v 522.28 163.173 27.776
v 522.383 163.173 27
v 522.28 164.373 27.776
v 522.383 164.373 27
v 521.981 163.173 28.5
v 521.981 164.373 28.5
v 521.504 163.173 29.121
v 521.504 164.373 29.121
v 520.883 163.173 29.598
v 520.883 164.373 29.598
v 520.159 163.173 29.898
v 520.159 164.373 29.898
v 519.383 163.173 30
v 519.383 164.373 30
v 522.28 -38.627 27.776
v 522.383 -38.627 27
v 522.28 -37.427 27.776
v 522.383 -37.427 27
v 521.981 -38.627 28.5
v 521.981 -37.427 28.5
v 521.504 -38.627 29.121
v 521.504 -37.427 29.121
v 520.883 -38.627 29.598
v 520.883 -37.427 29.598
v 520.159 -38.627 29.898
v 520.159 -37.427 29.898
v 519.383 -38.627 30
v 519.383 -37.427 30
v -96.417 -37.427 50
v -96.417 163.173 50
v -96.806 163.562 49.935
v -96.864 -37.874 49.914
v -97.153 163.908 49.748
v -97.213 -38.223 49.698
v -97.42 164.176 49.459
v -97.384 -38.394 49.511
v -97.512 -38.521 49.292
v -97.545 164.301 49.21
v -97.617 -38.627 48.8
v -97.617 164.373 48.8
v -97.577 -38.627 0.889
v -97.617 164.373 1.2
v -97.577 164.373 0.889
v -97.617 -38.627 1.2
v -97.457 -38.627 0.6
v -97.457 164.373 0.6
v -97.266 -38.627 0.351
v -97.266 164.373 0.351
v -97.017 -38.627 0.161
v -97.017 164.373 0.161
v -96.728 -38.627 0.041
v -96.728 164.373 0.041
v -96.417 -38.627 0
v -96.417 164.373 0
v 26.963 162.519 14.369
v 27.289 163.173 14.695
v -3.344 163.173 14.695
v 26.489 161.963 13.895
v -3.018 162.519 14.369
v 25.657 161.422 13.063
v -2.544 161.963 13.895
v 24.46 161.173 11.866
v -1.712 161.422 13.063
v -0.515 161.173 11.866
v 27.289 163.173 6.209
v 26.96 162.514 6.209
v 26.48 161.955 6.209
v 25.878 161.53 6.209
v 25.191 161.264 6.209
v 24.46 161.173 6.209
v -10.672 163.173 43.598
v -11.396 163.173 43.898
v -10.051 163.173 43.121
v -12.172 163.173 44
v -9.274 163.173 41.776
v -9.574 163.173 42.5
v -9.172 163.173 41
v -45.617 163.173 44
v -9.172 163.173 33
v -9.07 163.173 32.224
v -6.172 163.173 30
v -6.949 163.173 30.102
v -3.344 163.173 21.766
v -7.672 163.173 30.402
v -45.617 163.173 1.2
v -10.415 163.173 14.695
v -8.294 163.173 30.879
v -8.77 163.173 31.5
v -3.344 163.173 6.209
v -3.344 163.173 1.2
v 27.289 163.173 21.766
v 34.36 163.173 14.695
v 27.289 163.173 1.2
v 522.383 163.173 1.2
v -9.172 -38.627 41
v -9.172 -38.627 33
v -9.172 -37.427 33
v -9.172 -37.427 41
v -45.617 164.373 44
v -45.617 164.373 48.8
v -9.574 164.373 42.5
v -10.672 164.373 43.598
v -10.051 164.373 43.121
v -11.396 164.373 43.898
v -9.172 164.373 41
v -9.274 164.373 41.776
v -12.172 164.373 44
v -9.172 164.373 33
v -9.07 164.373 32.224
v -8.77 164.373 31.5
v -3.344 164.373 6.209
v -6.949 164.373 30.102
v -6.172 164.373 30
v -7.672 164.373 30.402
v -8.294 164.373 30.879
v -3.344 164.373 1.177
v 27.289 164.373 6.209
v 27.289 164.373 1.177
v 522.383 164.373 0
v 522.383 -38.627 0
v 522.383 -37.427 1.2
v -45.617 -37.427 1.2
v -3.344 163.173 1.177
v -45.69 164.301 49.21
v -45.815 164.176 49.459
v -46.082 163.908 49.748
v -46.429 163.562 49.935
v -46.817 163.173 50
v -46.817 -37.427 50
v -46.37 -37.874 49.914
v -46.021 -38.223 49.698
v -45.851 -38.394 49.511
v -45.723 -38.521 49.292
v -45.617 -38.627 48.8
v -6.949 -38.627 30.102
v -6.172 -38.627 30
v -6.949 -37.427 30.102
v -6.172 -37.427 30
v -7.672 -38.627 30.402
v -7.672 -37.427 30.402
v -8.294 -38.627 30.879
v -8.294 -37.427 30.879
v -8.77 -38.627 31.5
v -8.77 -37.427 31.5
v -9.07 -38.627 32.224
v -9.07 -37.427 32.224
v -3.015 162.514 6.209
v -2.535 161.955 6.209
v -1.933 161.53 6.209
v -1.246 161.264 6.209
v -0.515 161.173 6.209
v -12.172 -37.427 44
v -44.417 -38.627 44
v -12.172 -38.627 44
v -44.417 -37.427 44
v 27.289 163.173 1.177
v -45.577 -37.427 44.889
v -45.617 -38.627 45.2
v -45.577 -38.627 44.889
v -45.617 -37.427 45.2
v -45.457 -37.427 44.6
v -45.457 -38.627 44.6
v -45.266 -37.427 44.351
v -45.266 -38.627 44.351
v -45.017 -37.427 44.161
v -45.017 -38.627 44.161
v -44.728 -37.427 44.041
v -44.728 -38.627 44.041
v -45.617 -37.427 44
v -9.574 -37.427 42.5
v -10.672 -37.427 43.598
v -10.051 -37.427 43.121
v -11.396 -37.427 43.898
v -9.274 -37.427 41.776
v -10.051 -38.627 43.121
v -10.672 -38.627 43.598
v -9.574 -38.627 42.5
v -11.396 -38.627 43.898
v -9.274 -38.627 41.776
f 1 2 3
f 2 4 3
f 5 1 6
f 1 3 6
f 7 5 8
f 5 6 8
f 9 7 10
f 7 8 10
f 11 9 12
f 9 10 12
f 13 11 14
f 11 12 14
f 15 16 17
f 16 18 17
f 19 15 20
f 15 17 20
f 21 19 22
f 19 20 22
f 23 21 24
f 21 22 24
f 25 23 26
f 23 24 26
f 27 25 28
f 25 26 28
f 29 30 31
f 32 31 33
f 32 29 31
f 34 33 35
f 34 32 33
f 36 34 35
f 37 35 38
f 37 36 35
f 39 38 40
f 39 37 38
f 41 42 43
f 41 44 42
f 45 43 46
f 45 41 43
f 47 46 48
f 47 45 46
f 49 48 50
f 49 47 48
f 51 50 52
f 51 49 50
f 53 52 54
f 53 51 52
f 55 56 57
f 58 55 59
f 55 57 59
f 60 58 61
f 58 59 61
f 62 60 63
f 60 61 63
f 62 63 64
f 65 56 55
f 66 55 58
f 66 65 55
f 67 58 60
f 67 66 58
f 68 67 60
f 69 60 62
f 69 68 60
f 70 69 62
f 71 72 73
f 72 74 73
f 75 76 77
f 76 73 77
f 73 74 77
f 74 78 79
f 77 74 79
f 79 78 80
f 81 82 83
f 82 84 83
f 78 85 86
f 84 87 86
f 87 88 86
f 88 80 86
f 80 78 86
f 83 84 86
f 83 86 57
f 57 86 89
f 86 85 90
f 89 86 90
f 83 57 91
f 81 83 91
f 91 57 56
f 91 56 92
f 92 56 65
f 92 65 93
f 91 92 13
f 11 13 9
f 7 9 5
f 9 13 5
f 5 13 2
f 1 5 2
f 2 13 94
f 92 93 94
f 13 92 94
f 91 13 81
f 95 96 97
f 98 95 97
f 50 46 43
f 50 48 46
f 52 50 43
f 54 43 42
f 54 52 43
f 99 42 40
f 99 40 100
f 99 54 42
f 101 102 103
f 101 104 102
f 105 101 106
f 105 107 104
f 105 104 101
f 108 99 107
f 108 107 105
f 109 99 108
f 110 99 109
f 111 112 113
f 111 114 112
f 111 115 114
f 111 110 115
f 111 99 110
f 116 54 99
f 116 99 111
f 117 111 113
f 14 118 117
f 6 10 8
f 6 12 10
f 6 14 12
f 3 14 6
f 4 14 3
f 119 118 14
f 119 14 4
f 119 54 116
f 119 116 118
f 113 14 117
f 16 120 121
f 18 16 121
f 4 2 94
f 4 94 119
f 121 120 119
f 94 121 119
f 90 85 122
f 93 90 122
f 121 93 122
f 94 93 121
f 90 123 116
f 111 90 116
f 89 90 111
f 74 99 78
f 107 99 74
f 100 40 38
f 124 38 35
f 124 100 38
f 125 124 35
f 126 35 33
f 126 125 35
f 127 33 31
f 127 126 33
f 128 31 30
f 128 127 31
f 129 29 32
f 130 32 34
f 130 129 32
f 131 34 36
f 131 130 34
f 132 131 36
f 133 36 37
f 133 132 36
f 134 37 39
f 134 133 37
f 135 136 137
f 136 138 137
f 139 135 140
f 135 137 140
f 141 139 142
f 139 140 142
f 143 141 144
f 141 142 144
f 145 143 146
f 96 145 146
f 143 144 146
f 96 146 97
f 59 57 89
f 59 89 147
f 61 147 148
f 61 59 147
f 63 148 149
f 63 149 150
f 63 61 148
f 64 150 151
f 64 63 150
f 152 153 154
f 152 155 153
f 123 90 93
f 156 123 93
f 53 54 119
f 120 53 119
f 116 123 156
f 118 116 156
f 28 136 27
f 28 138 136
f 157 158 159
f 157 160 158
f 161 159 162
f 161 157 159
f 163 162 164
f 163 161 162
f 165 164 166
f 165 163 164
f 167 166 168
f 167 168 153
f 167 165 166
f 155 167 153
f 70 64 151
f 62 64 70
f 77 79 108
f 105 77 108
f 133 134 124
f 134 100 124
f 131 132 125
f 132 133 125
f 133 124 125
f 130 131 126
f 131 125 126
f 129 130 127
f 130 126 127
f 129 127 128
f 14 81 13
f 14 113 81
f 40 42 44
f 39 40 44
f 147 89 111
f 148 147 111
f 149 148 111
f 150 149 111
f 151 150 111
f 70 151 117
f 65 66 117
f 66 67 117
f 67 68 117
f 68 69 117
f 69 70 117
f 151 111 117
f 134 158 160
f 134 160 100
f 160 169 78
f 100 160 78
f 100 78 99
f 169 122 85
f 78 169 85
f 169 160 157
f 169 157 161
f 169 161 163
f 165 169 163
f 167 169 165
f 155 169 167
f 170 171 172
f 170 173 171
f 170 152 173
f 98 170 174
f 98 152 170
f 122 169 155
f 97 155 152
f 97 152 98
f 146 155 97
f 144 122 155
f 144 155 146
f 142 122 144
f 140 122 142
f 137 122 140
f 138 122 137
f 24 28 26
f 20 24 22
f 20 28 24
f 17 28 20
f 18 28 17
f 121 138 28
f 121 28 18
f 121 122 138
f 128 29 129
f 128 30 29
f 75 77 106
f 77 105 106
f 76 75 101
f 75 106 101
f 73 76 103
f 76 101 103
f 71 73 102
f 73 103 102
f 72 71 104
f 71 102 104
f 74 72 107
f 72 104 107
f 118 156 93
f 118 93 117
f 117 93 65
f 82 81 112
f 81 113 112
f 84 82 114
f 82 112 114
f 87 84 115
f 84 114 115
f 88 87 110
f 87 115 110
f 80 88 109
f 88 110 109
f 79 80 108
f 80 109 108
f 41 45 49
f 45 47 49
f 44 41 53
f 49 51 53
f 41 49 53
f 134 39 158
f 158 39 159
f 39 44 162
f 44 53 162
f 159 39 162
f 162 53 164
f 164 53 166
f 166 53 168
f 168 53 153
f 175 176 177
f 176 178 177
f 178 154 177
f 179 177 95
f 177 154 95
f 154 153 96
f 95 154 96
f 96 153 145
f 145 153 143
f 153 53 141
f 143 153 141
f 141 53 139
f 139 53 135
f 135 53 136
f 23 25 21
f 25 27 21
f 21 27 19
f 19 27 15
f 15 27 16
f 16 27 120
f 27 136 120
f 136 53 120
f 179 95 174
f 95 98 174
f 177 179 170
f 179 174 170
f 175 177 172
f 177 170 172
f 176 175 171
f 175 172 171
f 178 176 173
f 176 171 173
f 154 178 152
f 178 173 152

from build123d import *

# Parameters (mm, degrees)
F0_W          = 52
F0_H          = 1.2
F0_H_2        = 200.6
F1_DEPTH      = 50
F0_W_2        = 36.4451892475
F2_DEPTH      = 44
F0_W_3        = 531.5548107525
F3_DEPTH      = 30
F4_DEPTH      = 1.2
F5_R          = 1.2
F6_R          = 3
F7_W          = 30.6323694531
F7_H          = 5.0316524575
F8_DEPTH      = 25
F9_W          = 30.6323694531
F9_H          = 8.4860329516
F10_DEPTH     = 2
F11_T1_DEPTH  = 44.7745050768
F11_T6_DEPTH  = 22.6281685754
F11_T11_DEPTH = 22.6281685754


# Not quite as in the source:
# - a fillet or chamfer that OpenCascade refuses, or shapes differently, is made with other operations: its cross-section is extruded or revolved along the edge and cut away or added


with BuildPart() as f1:
    # F0 (on Top) → F1 (new body)
    with BuildSketch(Plane.XY):
        with Locations((-71.6174369702, 163.7731539965)):
            Rectangle(F0_W, F0_H)
        with Locations((-71.6174369702, 62.8731539965)):
            Rectangle(F0_W, F0_H_2)
        with Locations((-71.6174369702, -38.0268460035)):
            Rectangle(F0_W, F0_H)
    extrude(amount=F1_DEPTH)

    # F0 (on Top) → F2 (join)
    with BuildSketch(Plane.XY):
        with Locations((-27.3948423465, -38.0268460035)):
            Rectangle(F0_W_2, F0_H)
        with Locations((-27.3948423465, 163.7731539965)):
            Rectangle(F0_W_2, F0_H)
    extrude(amount=F2_DEPTH)

    # F0 (on Top) → F3 (join)
    with BuildSketch(Plane.XY):
        with Locations((256.6051576535, 163.7731539965)):
            Rectangle(F0_W_3, F0_H)
        with Locations((256.6051576535, -38.0268460035)):
            Rectangle(F0_W_3, F0_H)
    extrude(amount=F3_DEPTH)

    # F0 (on Top) → F4 (join)
    with BuildSketch(Plane.XY):
        with Locations((256.6051576535, 62.8731539965)):
            Rectangle(F0_W_3, F0_H_2)
        with Locations((-27.3948423465, 62.8731539965)):
            Rectangle(F0_W_2, F0_H_2)
    extrude(amount=F4_DEPTH)

    # F5
    f5_edges = [f1.edges().sort_by_distance(p)[0] for p in [
        (-71.617437, -38.626846, 50),
        (-71.617437, 164.373154, 50),
        (-97.617437, 62.873154, 50),
        (-97.617437, 62.873154, 0),
        (-45.617437, 62.873154, 50),
        (-45.617437, -38.026846, 44),
    ]]
    fillet(f5_edges, radius=F5_R)

    # F6
    f6_edges = [f1.edges().sort_by_distance(p)[0] for p in [
        (-9.172248, -38.026846, 44),
        (522.382563, -38.026846, 30),
        (522.382563, 163.773154, 30),
        (-9.172248, 163.773154, 44),
        (-9.172248, 163.773154, 30),
        (-9.172248, -38.026846, 30),
    ]]
    fillet(f6_edges, radius=F6_R)

    # F7 (on face) → F8 (cut)
    with BuildSketch(Plane.XZ.offset(-163.1731539965)):
        with Locations((11.9725436671, 3.6928627233)):
            Rectangle(F7_W, F7_H)
    extrude(amount=-F8_DEPTH, mode=Mode.SUBTRACT)

    # F9 (on face) → F10 (join)
    with BuildSketch(Plane.XZ.offset(-163.1731539965)):
        with Locations((11.9725436671, 10.4517054278)):
            Rectangle(F9_W, F9_H)
    extrude(amount=F10_DEPTH)

    # F11: fillet of radius 3 on 3 edges, made by hand

    # F11_s2 → F11_t1 (cut)
    with BuildSketch(Plane.YZ.offset(-10.4147088713)):
        with BuildLine():
            ThreePointArc((163.1731539965, 14.6947219037), (161.7236642537, 13.5983455865), (161.1731539965, 11.8662947789))
            Line((161.1731539965, 11.8662947789), (161.1731539965, 14.6947219037))
            Line((161.1731539965, 14.6947219037), (163.1731539965, 14.6947219037))
        make_face()
    extrude(amount=F11_T1_DEPTH, mode=Mode.SUBTRACT)


with BuildPart() as f11_tool4:
    # F11_s5 → F11_t6 (new body)
    with BuildSketch(Plane.XY.offset(-0.8623788598)):
        with BuildLine():
            ThreePointArc((27.2887283936, 163.1731539965), (26.1923520764, 161.7236642537), (24.4603012689, 161.1731539965))
            Line((24.4603012689, 161.1731539965), (27.2887283936, 161.1731539965))
            Line((27.2887283936, 161.1731539965), (27.2887283936, 163.1731539965))
        make_face()
    extrude(amount=F11_T6_DEPTH)

    split(bisect_by=Plane.XY.offset(1.2), keep=Keep.TOP)


with BuildPart() as f1_1:
    add(f1.part)

    # F11_t3: cut F11_tool4
    add(f11_tool4.part, mode=Mode.SUBTRACT)


with BuildPart() as f11_tool9:
    # F11_s10 → F11_t11 (new body)
    with BuildSketch(Plane.XY.offset(21.7657897155)):
        with BuildLine():
            ThreePointArc((-3.3436410595, 163.1731539965), (-2.2472647423, 161.7236642537), (-0.5152139347, 161.1731539965))
            Line((-0.5152139347, 161.1731539965), (-3.3436410595, 161.1731539965))
            Line((-3.3436410595, 161.1731539965), (-3.3436410595, 163.1731539965))
        make_face()
    extrude(amount=-F11_T11_DEPTH)

    split(bisect_by=Plane.XY.offset(1.2), keep=Keep.TOP)


with BuildPart() as f1_2:
    add(f1_1.part)

    # F11_t8: cut F11_tool9
    add(f11_tool9.part, mode=Mode.SUBTRACT)


solid = f1_2.part
